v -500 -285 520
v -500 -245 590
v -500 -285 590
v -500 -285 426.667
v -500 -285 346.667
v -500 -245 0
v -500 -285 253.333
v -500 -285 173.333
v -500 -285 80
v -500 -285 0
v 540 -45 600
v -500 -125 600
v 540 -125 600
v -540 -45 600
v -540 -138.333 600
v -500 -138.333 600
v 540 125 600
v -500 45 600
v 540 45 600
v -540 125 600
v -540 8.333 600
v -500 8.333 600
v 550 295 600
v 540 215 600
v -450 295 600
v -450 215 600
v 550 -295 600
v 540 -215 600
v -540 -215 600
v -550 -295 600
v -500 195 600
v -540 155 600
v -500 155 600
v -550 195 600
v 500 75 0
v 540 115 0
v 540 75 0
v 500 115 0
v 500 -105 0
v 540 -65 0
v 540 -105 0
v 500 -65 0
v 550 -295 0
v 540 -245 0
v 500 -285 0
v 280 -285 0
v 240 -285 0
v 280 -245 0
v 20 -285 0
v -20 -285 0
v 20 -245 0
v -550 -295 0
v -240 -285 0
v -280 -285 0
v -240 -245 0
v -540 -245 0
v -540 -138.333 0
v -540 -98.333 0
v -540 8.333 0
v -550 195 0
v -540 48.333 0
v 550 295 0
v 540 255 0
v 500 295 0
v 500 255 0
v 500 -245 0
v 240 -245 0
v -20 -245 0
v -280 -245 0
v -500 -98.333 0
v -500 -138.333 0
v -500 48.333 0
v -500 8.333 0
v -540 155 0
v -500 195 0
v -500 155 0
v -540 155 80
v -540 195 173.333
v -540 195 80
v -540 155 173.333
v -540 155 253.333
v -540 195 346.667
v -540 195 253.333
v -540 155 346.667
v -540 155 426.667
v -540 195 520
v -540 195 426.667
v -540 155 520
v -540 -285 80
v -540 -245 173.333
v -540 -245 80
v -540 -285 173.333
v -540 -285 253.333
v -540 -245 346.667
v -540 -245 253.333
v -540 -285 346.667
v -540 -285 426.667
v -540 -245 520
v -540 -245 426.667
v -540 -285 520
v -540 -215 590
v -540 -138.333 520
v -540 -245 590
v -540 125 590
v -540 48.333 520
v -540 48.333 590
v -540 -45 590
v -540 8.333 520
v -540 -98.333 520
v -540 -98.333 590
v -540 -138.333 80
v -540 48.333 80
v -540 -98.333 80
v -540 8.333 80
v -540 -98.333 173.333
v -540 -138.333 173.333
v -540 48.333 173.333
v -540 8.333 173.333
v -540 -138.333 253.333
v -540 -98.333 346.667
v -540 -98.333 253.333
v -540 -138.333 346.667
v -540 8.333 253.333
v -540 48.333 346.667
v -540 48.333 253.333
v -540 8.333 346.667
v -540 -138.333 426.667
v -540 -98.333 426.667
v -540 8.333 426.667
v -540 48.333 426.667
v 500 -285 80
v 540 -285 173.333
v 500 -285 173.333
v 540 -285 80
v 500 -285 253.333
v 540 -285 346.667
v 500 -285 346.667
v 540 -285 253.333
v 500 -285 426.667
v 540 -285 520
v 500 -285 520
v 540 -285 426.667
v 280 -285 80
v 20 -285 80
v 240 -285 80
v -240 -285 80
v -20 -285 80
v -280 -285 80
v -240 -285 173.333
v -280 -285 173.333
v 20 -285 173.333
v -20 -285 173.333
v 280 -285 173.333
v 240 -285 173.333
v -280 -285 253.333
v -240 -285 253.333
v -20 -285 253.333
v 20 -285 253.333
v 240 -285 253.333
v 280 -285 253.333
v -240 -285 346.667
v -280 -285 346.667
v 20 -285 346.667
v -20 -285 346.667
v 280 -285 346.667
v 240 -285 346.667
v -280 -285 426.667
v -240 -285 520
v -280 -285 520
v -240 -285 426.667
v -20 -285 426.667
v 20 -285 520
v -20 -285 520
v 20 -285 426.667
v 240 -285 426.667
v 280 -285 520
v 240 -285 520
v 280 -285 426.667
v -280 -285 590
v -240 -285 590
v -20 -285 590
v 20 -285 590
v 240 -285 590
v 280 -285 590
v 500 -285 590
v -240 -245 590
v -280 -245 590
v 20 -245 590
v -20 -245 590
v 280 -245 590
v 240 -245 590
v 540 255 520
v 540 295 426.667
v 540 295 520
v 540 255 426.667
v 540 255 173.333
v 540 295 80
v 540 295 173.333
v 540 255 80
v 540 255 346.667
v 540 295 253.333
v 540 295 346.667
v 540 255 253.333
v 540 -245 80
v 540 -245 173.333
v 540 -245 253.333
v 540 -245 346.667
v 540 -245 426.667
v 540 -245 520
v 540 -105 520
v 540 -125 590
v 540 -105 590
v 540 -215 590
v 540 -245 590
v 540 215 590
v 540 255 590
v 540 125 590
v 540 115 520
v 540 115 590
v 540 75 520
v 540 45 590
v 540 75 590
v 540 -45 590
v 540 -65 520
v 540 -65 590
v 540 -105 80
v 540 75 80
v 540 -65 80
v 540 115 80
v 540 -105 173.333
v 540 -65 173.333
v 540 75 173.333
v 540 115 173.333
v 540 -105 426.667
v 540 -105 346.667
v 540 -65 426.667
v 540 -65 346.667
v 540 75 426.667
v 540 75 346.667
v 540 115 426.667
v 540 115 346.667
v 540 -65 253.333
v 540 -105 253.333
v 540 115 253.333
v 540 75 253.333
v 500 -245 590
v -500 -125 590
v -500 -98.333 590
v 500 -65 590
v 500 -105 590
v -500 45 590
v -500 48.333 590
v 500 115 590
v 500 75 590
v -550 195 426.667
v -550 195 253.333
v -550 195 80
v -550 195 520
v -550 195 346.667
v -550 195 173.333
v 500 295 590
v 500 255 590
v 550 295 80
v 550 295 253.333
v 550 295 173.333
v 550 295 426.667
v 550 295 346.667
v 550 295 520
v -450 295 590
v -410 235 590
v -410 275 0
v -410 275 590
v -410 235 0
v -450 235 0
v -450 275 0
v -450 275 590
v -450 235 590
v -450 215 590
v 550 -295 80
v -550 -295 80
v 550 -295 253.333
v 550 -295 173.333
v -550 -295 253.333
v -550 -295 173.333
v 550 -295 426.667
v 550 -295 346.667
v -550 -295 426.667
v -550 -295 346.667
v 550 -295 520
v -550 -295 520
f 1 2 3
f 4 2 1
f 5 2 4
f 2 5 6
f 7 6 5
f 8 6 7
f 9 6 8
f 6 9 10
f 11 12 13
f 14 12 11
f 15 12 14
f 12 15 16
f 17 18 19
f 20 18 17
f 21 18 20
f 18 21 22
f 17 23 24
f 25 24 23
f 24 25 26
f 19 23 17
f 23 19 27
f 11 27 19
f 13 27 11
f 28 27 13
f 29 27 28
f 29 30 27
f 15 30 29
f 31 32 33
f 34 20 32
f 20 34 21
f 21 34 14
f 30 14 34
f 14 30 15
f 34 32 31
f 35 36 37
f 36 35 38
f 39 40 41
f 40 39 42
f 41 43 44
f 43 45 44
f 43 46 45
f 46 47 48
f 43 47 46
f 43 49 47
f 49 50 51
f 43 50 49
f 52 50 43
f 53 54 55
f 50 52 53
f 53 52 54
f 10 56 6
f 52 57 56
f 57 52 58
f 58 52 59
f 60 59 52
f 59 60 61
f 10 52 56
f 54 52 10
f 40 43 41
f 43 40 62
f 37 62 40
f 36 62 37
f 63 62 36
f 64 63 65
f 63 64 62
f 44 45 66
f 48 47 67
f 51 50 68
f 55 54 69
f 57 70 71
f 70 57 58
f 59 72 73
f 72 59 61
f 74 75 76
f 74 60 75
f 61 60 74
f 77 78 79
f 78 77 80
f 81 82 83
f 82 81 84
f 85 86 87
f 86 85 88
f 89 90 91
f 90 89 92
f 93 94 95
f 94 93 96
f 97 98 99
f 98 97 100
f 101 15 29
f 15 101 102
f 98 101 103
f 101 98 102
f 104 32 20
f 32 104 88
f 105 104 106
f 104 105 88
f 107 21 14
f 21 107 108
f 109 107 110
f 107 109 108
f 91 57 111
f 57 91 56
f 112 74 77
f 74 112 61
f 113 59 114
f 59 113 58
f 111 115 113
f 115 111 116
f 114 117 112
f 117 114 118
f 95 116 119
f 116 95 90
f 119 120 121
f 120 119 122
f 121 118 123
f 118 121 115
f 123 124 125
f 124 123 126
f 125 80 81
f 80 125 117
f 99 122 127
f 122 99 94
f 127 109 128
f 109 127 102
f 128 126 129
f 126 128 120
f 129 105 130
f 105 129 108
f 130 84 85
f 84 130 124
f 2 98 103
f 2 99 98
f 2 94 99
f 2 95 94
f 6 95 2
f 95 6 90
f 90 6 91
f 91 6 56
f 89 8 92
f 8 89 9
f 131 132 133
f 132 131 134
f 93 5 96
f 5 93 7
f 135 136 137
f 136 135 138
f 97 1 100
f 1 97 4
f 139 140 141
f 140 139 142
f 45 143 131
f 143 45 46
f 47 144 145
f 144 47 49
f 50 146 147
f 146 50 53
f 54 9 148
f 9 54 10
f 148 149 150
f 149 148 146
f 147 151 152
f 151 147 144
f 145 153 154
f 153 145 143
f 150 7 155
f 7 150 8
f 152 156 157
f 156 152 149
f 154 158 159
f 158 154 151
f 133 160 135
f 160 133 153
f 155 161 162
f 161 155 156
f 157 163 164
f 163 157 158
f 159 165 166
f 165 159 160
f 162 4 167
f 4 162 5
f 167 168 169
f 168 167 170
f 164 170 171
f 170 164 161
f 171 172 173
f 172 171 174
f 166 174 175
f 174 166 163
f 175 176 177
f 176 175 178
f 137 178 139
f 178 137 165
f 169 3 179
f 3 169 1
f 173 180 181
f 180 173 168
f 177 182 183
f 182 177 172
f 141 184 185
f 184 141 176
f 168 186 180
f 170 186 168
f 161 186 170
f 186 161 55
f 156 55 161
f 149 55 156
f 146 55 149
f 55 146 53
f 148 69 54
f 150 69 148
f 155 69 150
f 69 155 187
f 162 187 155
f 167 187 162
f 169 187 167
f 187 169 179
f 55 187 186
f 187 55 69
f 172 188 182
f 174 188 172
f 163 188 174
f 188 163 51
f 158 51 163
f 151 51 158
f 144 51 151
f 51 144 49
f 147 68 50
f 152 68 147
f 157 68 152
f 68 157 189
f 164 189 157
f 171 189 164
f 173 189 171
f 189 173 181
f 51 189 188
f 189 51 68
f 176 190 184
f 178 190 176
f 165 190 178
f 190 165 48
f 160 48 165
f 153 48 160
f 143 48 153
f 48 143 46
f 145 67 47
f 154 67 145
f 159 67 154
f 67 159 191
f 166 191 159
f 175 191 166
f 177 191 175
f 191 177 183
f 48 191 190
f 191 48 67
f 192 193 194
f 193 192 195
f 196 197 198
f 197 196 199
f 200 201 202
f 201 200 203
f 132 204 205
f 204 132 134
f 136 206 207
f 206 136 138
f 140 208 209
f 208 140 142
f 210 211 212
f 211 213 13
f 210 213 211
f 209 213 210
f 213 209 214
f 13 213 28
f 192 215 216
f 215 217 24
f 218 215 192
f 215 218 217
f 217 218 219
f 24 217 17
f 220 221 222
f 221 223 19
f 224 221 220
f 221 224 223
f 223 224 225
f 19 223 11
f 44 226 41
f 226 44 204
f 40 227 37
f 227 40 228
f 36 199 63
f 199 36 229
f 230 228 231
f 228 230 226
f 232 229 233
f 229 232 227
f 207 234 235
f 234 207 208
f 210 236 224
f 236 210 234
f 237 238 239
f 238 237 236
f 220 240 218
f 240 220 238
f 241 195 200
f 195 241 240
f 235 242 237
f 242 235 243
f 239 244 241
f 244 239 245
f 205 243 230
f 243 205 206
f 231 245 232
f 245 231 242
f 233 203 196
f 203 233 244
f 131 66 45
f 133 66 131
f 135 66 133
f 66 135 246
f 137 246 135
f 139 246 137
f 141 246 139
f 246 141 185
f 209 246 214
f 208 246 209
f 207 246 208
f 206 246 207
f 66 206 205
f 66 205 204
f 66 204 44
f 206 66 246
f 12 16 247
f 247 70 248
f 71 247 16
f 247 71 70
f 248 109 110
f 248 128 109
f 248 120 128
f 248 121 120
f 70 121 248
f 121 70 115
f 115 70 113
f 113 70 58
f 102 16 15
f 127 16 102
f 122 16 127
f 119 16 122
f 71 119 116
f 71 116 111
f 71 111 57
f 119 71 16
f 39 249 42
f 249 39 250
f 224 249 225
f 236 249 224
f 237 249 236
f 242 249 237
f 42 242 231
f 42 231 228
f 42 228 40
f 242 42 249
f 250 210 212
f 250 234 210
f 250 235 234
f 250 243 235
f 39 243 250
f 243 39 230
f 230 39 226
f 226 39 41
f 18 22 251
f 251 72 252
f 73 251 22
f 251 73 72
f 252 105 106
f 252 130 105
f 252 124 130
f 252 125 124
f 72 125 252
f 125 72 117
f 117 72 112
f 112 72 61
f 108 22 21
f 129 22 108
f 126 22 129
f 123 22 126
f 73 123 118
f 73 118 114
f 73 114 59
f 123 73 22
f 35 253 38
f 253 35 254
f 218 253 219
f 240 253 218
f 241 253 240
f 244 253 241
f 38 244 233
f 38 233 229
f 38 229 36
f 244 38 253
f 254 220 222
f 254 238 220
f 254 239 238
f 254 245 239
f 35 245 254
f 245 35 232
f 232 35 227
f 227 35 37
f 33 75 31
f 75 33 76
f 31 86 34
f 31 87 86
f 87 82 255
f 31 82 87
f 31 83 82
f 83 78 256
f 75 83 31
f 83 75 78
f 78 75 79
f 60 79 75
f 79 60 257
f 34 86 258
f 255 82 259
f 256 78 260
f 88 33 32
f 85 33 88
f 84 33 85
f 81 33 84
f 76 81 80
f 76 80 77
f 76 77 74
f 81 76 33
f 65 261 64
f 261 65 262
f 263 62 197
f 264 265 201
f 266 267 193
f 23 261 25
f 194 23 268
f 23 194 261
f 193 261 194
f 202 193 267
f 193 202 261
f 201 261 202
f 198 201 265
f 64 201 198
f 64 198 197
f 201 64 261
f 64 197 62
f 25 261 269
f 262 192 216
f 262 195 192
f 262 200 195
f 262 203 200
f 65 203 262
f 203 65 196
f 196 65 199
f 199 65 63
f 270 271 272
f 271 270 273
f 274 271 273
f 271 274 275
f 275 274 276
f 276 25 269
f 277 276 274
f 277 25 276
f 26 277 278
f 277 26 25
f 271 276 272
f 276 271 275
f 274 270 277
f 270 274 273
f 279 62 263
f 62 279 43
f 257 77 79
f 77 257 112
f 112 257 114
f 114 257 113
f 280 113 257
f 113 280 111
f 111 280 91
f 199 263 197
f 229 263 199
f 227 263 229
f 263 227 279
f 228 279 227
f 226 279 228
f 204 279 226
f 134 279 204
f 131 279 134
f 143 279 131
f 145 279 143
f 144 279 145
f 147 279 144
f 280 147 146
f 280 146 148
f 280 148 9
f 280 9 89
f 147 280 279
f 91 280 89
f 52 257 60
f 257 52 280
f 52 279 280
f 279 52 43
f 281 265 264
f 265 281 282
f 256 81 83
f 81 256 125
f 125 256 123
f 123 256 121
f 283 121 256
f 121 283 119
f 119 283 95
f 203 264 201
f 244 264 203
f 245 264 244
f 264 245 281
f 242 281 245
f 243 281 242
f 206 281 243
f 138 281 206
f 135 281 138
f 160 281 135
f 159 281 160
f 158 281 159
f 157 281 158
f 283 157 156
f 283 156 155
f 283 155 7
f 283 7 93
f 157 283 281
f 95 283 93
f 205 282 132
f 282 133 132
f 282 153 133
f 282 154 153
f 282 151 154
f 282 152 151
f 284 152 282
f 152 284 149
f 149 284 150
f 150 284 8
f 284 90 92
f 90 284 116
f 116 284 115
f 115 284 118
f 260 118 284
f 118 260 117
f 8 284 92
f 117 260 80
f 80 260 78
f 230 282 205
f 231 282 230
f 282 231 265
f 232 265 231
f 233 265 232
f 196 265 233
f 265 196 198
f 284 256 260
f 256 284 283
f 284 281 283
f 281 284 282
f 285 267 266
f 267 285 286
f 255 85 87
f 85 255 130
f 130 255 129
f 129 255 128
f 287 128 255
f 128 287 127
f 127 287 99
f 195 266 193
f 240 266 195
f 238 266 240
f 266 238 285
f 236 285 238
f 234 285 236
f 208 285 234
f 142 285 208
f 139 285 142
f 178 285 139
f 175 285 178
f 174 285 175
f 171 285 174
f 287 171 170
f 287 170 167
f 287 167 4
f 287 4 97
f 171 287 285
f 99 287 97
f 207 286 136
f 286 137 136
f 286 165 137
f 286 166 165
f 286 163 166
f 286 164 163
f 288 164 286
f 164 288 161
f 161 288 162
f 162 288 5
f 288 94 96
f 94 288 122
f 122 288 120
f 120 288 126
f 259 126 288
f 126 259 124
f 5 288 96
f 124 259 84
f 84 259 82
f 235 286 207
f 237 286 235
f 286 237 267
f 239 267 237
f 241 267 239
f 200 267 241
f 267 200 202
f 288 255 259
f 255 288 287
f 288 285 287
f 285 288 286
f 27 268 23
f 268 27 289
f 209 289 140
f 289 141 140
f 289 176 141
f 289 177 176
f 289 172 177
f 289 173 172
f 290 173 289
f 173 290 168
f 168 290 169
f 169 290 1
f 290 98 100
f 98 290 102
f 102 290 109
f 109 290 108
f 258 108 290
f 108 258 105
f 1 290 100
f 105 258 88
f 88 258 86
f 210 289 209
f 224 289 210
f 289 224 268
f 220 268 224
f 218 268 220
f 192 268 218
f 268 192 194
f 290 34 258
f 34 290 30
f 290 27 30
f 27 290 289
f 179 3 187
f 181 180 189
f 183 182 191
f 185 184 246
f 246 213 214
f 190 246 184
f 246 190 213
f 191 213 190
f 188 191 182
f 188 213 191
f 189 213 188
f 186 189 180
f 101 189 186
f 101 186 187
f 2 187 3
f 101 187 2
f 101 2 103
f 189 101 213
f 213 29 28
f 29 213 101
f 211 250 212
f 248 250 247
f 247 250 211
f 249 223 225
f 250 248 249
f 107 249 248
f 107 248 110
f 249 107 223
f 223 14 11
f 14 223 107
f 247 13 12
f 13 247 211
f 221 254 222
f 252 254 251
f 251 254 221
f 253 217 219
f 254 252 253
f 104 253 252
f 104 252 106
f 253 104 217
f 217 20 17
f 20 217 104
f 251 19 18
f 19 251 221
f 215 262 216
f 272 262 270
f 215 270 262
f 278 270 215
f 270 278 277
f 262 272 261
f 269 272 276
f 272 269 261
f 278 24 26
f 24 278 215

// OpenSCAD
/*
  Alternative 1: service-friendly slatted AC cover.

  Same clear internal footprint inside battens:
    1000 mm wide x 500 mm deep x 600 mm high

  Design intent:
    - Open back and bottom.
    - Flat horizontal slats.
    - Removable/service-friendly front concept.
    - Same asymmetric left side depth from the final design.
*/

$fn = 24;

clear_width_inside_battens = 1000;
clear_depth_inside_battens = 500;
box_height = 600;

panel_thickness = 10;
slat_height = 80;
batten_size = 40;
left_side_depth = 490;

box_width = clear_width_inside_battens + (2 * panel_thickness) + (2 * batten_size);
box_depth = clear_depth_inside_battens + panel_thickness + (2 * batten_size);

front_slat_count = 4;
side_slat_count = 4;
top_slat_count = 4;

front_gap = (box_height - (front_slat_count * slat_height)) / (front_slat_count - 1);
top_gap = (box_depth - (top_slat_count * slat_height)) / (top_slat_count - 1);

rear_top_shorten = 100;

wood_color = [0.72, 0.45, 0.24];
batten_color = [0.55, 0.31, 0.16];

module part(size, position, color_value = wood_color) {
  color(color_value)
    translate(position)
      cube(size, center = true);
}

module batten(position) {
  part([batten_size, batten_size, box_height], position, batten_color);
}

module battens() {
  front_y = -box_depth / 2 + panel_thickness + batten_size / 2;
  rear_y = box_depth / 2 - batten_size / 2;
  left_rear_y = -box_depth / 2 + left_side_depth - batten_size / 2;
  left_x = -box_width / 2 + panel_thickness + batten_size / 2;
  right_x = box_width / 2 - panel_thickness - batten_size / 2;

  for (i = [0 : 4]) {
    x = left_x + i * ((right_x - left_x) / 4);
    batten([x, front_y, box_height / 2]);
  }

  for (i = [1 : 3]) {
    batten([left_x, front_y + i * ((left_rear_y - front_y) / 3), box_height / 2]);
    batten([right_x, front_y + i * ((rear_y - front_y) / 3), box_height / 2]);
  }

  rear_top_y = -box_depth / 2 + slat_height / 2 + (top_slat_count - 1) * (slat_height + top_gap);
  rear_top_left_edge_x = -box_width / 2 + rear_top_shorten;
  batten([rear_top_left_edge_x + batten_size / 2, rear_top_y, box_height / 2]);
}

module service_screen() {
  battens();

  for (i = [0 : front_slat_count - 1]) {
    z = slat_height / 2 + i * (slat_height + front_gap);
    part([box_width, panel_thickness, slat_height], [0, -box_depth / 2 + panel_thickness / 2, z]);
  }

  for (i = [0 : side_slat_count - 1]) {
    z = slat_height / 2 + i * (slat_height + front_gap);
    part([panel_thickness, left_side_depth, slat_height], [-box_width / 2 + panel_thickness / 2, -box_depth / 2 + left_side_depth / 2, z]);
    part([panel_thickness, box_depth, slat_height], [box_width / 2 - panel_thickness / 2, 0, z]);
  }

  for (i = [0 : top_slat_count - 1]) {
    y = -box_depth / 2 + slat_height / 2 + i * (slat_height + top_gap);
    top_length = i == top_slat_count - 1 ? box_width - rear_top_shorten : box_width;
    top_x = i == top_slat_count - 1 ? rear_top_shorten / 2 : 0;
    part([top_length, slat_height, panel_thickness], [top_x, y, box_height - panel_thickness / 2]);
  }
}

service_screen();

/*
  Approximate cut list:
    Front slats: 4 x 1100 x 80 x 10 mm
    Left side slats: 4 x 490 x 80 x 10 mm
    Right side slats: 4 x 590 x 80 x 10 mm
    Top slats: 3 x 1100 x 80 x 10 mm
    Rear top slat: 1 x 1000 x 80 x 10 mm
    Battens: 12 x 40 x 40 x 600 mm
*/
